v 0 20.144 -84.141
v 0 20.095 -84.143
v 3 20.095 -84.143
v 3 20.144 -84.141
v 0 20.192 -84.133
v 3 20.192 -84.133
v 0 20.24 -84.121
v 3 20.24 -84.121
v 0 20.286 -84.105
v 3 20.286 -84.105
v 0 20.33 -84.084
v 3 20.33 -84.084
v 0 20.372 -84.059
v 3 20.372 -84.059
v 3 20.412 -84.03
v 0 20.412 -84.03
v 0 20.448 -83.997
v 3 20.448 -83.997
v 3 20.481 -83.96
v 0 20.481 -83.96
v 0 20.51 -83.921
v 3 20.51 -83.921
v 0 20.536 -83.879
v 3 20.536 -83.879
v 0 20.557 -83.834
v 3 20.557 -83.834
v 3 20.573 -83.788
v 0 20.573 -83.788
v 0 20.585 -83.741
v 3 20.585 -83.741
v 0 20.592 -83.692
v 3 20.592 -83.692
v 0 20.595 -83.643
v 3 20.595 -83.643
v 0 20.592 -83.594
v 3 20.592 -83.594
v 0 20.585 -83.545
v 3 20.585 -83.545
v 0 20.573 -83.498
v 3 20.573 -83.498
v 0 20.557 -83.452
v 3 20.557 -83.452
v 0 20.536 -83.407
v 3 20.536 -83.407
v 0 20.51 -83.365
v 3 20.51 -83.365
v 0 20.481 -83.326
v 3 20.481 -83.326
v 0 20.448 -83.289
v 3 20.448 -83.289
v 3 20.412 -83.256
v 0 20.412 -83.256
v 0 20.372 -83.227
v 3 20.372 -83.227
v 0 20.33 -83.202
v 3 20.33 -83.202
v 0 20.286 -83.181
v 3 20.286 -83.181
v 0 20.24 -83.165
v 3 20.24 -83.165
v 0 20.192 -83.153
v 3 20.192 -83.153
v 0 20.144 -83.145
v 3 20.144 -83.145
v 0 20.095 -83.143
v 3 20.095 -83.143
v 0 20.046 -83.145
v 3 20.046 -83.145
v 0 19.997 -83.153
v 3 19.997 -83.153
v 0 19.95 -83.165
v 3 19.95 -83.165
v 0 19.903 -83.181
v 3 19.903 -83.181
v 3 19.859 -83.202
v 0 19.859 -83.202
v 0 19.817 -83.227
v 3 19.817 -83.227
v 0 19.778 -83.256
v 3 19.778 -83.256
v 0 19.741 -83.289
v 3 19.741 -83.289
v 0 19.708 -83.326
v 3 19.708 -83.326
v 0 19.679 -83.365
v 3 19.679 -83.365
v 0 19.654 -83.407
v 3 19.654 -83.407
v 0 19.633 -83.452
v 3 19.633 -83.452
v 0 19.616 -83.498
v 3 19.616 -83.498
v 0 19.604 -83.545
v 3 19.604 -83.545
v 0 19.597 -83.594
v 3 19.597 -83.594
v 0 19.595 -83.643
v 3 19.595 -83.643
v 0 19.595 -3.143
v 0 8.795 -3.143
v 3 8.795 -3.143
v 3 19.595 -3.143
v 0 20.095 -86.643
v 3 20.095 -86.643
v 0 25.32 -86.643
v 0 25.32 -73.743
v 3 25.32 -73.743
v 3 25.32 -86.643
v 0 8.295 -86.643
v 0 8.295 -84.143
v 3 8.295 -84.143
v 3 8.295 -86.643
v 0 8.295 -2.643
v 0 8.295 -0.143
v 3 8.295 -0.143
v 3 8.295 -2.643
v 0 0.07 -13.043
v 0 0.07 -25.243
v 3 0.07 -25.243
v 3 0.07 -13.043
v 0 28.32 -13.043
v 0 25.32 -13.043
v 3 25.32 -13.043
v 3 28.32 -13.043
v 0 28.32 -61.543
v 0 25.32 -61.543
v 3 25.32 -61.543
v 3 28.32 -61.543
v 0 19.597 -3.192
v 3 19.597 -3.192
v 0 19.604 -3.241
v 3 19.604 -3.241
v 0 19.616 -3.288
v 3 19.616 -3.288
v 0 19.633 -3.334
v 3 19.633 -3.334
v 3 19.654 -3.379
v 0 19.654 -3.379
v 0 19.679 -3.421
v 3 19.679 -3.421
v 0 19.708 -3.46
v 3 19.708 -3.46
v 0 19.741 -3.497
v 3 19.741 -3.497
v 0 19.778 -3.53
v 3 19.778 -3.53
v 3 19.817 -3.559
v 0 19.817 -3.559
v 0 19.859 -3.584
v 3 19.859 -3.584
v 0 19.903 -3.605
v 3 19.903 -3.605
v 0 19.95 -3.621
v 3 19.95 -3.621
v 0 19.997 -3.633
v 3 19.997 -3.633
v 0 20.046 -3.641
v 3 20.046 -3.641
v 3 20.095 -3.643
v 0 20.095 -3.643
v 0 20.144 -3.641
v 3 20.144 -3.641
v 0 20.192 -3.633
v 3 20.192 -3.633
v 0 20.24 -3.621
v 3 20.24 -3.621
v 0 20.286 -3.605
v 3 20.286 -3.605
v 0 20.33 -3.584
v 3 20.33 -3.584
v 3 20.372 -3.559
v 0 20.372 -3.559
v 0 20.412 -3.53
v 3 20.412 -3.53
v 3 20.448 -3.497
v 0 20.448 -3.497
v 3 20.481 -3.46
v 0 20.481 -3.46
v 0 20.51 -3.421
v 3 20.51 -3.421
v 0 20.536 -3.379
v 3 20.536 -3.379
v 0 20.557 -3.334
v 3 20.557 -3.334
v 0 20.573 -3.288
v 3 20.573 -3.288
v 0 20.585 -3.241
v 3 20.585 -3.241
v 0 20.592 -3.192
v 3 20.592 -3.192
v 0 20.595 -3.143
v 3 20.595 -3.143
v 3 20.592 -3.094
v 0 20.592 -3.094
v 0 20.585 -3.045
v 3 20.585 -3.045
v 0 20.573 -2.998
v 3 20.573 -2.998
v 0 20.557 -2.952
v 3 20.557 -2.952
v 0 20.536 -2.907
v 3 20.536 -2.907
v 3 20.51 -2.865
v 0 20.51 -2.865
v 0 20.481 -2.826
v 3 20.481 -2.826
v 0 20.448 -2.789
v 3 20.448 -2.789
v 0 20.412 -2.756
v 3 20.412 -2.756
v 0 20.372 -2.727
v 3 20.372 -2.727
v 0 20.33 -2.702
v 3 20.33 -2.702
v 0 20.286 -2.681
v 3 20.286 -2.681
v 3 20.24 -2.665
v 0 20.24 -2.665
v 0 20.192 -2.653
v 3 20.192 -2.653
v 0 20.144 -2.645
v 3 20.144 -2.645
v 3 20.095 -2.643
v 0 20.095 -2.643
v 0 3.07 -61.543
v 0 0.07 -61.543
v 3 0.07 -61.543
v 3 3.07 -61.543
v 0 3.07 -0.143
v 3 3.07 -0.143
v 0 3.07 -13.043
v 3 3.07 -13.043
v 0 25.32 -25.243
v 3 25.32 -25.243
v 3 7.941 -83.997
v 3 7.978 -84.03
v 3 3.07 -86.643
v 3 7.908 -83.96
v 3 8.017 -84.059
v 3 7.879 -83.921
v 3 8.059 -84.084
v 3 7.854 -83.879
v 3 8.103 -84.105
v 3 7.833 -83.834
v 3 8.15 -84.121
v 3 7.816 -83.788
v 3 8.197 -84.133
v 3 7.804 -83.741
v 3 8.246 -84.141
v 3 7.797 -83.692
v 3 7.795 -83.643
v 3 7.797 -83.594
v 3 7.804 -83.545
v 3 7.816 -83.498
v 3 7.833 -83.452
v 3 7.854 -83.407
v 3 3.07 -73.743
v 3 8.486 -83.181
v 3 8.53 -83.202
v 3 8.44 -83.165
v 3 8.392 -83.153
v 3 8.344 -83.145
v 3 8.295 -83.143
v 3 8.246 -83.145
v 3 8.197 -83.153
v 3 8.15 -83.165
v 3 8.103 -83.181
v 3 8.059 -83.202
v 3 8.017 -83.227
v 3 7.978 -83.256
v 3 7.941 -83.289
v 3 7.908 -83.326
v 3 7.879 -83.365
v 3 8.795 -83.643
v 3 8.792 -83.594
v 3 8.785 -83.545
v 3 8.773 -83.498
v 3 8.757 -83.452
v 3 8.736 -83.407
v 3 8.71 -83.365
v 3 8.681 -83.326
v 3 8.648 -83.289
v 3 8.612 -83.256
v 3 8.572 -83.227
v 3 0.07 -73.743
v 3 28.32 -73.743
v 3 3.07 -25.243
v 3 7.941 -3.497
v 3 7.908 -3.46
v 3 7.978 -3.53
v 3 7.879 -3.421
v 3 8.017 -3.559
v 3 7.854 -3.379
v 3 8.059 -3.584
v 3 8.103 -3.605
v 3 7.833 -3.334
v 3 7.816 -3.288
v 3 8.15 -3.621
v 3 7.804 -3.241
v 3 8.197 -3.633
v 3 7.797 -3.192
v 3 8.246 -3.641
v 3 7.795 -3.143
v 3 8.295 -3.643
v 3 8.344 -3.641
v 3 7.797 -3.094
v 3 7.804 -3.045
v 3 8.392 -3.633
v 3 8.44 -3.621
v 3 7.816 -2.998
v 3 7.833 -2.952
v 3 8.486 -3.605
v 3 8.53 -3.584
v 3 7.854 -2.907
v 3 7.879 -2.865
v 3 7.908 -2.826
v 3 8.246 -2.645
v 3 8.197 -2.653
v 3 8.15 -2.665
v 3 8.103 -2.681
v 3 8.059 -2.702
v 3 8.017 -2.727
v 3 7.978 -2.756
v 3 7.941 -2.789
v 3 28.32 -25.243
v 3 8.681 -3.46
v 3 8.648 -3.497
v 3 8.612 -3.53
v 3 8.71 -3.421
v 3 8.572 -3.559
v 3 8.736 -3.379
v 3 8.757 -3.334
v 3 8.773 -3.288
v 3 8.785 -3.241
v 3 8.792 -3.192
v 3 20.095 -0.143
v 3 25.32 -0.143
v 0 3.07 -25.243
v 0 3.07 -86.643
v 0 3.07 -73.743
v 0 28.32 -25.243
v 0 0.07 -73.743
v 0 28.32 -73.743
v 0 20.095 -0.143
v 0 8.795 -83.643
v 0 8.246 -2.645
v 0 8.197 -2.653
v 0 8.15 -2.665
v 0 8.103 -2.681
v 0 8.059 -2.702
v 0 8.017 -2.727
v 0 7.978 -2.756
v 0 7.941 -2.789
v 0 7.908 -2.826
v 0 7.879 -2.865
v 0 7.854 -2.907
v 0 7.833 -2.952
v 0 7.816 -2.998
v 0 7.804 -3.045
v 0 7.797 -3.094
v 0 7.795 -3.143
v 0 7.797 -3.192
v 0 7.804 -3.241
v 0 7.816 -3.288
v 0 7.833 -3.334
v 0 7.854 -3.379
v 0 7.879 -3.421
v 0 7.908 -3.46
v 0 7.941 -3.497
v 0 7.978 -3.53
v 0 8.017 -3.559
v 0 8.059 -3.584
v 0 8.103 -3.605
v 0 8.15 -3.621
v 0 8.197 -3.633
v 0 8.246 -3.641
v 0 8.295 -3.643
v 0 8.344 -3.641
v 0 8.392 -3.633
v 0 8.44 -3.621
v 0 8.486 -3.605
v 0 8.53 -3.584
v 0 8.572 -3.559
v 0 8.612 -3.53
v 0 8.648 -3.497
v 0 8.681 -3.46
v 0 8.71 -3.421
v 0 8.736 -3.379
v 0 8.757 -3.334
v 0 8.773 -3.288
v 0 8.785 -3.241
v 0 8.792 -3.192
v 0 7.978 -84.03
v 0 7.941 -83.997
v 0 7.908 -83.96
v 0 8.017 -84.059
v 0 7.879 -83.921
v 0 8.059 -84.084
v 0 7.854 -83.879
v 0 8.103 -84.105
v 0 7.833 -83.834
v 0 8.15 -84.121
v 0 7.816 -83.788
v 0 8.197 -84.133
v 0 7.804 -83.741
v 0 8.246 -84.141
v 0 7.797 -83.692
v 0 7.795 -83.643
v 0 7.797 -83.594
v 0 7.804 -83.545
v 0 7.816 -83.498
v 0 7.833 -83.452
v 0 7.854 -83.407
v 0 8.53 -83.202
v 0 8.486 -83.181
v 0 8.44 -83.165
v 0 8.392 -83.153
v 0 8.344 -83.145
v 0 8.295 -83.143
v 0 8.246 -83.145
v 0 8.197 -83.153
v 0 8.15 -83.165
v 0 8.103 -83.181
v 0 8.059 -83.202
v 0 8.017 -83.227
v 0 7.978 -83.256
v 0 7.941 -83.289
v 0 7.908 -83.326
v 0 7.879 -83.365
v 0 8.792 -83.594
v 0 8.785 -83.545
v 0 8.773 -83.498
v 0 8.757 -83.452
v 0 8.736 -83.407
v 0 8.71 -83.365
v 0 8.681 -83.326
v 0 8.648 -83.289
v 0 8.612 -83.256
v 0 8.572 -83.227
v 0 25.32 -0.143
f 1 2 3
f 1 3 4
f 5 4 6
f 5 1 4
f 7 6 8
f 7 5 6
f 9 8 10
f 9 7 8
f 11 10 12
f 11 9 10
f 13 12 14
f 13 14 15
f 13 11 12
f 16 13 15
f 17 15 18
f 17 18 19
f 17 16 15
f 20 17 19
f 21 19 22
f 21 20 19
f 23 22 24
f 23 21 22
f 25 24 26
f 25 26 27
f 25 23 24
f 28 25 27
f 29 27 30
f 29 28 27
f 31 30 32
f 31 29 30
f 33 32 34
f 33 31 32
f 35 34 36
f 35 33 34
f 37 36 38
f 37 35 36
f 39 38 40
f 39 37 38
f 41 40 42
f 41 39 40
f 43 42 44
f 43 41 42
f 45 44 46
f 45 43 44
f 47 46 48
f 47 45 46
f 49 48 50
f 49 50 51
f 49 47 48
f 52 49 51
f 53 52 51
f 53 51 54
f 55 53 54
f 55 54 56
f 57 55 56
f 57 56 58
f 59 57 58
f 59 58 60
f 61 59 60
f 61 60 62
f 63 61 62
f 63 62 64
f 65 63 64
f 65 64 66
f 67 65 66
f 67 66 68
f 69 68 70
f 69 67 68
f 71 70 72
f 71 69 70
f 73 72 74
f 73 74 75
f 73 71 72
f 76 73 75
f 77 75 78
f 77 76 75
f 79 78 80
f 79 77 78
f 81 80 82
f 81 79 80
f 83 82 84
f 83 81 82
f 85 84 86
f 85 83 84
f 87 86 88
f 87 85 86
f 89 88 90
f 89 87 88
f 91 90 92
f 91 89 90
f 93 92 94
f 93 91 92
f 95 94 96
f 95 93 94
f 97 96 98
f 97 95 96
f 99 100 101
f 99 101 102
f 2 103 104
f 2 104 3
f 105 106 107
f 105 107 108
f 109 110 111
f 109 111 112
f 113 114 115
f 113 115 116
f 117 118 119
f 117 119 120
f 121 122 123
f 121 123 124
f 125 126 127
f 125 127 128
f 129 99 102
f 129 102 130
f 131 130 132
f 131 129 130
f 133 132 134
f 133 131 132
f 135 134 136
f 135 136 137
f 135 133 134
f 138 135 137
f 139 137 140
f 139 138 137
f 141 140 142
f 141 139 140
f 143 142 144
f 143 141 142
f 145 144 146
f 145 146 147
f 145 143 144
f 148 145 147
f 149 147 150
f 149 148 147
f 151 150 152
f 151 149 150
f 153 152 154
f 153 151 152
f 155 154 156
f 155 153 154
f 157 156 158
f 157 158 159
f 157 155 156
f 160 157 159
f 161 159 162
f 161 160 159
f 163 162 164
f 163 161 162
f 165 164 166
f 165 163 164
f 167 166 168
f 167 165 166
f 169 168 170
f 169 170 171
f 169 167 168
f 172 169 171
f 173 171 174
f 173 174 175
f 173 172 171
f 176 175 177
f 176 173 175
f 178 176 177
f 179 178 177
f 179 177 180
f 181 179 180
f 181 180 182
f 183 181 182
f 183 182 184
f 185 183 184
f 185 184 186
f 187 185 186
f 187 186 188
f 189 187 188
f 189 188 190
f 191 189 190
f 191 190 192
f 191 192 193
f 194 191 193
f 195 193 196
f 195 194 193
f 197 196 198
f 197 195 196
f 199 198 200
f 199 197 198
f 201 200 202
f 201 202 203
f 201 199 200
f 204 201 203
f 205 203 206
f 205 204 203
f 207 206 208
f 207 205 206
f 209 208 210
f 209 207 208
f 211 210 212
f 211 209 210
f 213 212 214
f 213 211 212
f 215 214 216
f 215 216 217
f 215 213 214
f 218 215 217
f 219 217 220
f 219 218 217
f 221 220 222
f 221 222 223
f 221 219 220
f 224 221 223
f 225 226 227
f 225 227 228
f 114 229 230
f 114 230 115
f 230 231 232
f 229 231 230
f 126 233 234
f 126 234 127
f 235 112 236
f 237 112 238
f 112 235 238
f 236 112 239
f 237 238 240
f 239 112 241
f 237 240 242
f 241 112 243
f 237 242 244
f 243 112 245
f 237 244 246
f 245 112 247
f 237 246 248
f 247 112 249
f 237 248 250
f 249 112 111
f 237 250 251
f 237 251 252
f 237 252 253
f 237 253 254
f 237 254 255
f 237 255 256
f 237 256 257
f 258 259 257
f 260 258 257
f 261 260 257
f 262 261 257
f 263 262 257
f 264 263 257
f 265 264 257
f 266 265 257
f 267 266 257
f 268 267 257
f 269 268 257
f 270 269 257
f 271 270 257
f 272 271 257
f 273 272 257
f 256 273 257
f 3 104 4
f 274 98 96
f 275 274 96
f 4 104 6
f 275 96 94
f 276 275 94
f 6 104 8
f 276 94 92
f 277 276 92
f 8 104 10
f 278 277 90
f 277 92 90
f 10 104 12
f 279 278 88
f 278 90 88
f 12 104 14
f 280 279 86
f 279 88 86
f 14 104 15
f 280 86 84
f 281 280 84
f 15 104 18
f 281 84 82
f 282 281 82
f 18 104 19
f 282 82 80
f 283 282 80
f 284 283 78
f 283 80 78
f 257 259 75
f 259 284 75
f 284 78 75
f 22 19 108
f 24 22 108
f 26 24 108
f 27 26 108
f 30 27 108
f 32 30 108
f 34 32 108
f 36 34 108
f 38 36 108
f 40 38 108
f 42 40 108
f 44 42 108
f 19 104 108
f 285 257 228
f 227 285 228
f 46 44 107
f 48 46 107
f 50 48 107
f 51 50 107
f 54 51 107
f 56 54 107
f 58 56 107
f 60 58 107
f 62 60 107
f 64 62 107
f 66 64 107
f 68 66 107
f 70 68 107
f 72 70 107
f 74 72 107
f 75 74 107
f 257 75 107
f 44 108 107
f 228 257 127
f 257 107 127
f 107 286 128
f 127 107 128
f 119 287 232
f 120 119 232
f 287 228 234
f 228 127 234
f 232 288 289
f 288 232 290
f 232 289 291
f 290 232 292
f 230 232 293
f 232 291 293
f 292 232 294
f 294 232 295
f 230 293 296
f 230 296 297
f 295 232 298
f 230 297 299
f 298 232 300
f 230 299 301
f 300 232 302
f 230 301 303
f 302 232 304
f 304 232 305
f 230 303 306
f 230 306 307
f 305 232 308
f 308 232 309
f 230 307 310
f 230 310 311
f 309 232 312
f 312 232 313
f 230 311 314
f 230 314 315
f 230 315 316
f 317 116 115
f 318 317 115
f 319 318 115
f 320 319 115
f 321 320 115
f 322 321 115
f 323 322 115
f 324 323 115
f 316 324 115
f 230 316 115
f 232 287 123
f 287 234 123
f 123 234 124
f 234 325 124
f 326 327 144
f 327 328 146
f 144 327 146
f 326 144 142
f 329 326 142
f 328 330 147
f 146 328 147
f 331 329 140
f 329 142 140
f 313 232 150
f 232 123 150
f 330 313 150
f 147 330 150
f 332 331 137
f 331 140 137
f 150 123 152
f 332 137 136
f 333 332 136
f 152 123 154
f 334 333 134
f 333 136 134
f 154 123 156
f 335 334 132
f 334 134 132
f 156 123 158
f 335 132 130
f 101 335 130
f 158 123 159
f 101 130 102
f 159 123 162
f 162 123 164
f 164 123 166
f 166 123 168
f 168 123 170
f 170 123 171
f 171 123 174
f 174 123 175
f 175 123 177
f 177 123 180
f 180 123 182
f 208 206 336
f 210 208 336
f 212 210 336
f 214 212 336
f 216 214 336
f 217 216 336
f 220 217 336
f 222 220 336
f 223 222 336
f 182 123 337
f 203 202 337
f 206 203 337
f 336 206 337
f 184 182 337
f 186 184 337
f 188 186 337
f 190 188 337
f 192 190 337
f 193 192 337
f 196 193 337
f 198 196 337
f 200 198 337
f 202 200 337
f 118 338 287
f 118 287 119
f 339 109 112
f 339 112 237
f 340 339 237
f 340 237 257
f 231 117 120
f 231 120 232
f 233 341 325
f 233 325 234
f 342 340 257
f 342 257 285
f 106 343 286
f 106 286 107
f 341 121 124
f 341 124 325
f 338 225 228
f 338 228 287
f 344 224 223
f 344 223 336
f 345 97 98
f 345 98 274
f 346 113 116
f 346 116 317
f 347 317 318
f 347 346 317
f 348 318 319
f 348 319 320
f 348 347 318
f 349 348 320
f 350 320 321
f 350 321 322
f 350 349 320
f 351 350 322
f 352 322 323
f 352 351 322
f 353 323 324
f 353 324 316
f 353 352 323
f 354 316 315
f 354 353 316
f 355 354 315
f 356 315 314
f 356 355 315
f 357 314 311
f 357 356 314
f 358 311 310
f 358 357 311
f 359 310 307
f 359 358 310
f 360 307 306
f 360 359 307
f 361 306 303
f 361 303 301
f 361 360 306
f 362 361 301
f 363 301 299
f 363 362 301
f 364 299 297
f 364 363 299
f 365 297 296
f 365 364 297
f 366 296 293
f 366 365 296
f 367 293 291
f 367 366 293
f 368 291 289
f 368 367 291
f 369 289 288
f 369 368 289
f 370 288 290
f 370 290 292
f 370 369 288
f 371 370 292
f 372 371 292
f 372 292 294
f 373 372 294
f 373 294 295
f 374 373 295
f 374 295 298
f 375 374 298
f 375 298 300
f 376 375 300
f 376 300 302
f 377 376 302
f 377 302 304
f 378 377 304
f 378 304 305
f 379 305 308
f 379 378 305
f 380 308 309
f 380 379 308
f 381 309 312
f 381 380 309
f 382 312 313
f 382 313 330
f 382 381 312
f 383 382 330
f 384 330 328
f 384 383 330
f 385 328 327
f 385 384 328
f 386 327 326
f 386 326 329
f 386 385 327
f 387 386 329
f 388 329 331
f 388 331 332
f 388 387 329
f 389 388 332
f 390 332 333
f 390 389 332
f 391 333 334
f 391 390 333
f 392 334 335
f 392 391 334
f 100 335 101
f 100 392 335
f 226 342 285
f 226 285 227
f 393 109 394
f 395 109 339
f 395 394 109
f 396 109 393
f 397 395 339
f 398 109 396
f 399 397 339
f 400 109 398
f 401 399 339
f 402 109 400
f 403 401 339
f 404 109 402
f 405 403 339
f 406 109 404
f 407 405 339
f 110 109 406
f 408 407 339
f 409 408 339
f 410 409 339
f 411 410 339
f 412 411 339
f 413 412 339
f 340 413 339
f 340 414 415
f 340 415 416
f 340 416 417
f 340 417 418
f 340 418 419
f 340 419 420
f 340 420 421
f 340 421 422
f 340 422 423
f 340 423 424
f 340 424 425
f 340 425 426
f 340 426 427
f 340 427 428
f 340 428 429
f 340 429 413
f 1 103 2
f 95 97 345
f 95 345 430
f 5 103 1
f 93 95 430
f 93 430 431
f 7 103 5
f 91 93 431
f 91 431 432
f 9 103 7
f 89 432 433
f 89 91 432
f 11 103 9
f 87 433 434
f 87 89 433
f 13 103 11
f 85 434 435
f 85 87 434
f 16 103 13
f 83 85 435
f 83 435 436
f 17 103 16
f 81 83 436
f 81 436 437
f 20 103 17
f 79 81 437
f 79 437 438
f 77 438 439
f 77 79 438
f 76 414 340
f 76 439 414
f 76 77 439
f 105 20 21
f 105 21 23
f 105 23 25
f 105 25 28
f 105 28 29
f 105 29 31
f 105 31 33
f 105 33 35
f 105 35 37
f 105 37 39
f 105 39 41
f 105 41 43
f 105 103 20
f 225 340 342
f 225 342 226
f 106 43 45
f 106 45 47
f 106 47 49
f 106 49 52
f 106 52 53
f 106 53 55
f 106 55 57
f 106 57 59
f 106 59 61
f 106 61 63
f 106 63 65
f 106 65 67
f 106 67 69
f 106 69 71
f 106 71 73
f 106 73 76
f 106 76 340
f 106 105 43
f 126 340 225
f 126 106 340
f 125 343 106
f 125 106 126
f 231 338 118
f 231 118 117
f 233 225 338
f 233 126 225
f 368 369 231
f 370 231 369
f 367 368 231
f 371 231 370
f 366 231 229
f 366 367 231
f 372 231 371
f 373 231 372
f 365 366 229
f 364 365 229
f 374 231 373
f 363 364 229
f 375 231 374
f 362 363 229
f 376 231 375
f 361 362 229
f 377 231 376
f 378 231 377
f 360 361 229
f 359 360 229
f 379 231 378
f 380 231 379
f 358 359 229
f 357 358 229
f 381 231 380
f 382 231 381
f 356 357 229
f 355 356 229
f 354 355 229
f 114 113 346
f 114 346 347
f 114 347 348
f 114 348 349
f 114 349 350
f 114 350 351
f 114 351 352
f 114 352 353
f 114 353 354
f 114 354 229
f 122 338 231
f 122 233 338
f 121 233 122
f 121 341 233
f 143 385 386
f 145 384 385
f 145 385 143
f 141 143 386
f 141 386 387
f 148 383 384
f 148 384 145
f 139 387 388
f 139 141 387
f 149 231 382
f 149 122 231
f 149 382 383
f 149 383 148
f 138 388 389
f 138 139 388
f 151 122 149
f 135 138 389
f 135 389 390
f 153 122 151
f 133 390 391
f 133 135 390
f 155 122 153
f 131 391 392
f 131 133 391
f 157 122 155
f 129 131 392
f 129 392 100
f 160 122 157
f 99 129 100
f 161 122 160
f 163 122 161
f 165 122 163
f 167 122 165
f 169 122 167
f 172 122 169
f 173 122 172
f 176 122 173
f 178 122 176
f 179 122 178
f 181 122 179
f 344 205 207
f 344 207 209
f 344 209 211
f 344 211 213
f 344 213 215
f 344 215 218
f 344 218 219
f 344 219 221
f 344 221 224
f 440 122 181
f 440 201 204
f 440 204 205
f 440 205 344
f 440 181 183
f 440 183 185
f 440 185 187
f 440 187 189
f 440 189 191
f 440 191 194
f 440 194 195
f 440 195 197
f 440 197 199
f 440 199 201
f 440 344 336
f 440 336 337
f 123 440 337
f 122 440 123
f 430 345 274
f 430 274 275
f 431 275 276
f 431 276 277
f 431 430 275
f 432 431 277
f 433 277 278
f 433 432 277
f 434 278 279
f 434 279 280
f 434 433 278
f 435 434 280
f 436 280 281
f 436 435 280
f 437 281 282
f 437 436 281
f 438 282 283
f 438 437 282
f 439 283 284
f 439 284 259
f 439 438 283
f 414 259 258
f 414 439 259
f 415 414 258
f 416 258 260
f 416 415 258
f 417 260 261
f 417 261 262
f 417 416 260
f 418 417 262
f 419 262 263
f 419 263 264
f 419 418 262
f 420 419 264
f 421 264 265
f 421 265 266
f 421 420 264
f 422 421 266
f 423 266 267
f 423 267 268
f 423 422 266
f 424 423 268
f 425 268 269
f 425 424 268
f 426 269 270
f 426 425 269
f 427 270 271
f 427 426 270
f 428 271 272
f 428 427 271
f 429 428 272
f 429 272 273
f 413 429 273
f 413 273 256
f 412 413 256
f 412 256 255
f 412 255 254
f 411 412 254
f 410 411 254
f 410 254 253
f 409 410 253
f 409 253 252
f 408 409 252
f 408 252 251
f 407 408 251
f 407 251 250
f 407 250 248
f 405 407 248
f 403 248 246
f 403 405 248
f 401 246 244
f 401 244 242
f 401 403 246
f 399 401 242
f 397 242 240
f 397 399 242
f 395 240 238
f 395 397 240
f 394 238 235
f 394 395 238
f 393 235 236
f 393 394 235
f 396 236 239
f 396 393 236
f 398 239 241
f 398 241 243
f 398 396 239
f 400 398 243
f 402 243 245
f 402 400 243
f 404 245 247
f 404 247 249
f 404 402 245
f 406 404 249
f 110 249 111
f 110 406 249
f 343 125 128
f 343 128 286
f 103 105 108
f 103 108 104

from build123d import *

# Parameters (mm, degrees)
BOSS_EXTRUDE1_DEPTH = 3


with BuildPart() as part:
    # Sketch3 → Boss-Extrude1 (new body)
    with BuildSketch(Plane(origin=(0, 0, 0), x_dir=(0, 0, -1), z_dir=(1, 0, 0))):
        with BuildLine():
            Line((61.542999323, 28.319708212), (73.742999323, 28.319708212))
            Line((73.742999323, 28.319708212), (73.742999323, 25.319708212))
            Line((73.742999323, 25.319708212), (86.642999323, 25.319708212))
            Line((86.642999323, 25.319708212), (86.642999323, 20.094708212))
            Line((86.642999323, 20.094708212), (84.142999323, 20.094708212))
            ThreePointArc((84.142999323, 20.094708212), (83.289445933, 20.448261603), (83.642999323, 19.594708212))
            Line((83.642999323, 19.594708212), (83.642999323, 8.794708212))
            ThreePointArc((83.642999323, 8.794708212), (83.289445933, 7.941154822), (84.142999323, 8.294708212))
            Line((84.142999323, 8.294708212), (86.642999323, 8.294708212))
            Line((86.642999323, 8.294708212), (86.642999323, 3.069708212))
            Line((86.642999323, 3.069708212), (73.742999323, 3.069708212))
            Line((73.742999323, 3.069708212), (73.742999323, 0.069708212))
            Line((73.742999323, 0.069708212), (61.542999323, 0.069708212))
            Line((61.542999323, 0.069708212), (61.542999323, 3.069708212))
            Line((61.542999323, 3.069708212), (25.242999323, 3.069708212))
            Line((25.242999323, 3.069708212), (25.242999323, 0.069708212))
            Line((25.242999323, 0.069708212), (13.042999323, 0.069708212))
            Line((13.042999323, 0.069708212), (13.042999323, 3.069708212))
            Line((13.042999323, 3.069708212), (0.142999323, 3.069708212))
            Line((0.142999323, 3.069708212), (0.142999323, 8.294708212))
            Line((0.142999323, 8.294708212), (2.642999323, 8.294708212))
            ThreePointArc((2.642999323, 8.294708212), (3.496552714, 7.941154822), (3.142999323, 8.794708212))
            Line((3.142999323, 8.794708212), (3.142999323, 19.594708212))
            ThreePointArc((3.142999323, 19.594708212), (3.496552714, 20.448261603), (2.642999323, 20.094708212))
            Line((2.642999323, 20.094708212), (0.142999323, 20.094708212))
            Line((0.142999323, 20.094708212), (0.142999323, 25.319708212))
            Line((0.142999323, 25.319708212), (13.042999323, 25.319708212))
            Line((13.042999323, 25.319708212), (13.042999323, 28.319708212))
            Line((13.042999323, 28.319708212), (25.242999323, 28.319708212))
            Line((25.242999323, 28.319708212), (25.242999323, 25.319708212))
            Line((25.242999323, 25.319708212), (61.542999323, 25.319708212))
            Line((61.542999323, 25.319708212), (61.542999323, 28.319708212))
        make_face()
    extrude(amount=BOSS_EXTRUDE1_DEPTH)


solid = part.part
